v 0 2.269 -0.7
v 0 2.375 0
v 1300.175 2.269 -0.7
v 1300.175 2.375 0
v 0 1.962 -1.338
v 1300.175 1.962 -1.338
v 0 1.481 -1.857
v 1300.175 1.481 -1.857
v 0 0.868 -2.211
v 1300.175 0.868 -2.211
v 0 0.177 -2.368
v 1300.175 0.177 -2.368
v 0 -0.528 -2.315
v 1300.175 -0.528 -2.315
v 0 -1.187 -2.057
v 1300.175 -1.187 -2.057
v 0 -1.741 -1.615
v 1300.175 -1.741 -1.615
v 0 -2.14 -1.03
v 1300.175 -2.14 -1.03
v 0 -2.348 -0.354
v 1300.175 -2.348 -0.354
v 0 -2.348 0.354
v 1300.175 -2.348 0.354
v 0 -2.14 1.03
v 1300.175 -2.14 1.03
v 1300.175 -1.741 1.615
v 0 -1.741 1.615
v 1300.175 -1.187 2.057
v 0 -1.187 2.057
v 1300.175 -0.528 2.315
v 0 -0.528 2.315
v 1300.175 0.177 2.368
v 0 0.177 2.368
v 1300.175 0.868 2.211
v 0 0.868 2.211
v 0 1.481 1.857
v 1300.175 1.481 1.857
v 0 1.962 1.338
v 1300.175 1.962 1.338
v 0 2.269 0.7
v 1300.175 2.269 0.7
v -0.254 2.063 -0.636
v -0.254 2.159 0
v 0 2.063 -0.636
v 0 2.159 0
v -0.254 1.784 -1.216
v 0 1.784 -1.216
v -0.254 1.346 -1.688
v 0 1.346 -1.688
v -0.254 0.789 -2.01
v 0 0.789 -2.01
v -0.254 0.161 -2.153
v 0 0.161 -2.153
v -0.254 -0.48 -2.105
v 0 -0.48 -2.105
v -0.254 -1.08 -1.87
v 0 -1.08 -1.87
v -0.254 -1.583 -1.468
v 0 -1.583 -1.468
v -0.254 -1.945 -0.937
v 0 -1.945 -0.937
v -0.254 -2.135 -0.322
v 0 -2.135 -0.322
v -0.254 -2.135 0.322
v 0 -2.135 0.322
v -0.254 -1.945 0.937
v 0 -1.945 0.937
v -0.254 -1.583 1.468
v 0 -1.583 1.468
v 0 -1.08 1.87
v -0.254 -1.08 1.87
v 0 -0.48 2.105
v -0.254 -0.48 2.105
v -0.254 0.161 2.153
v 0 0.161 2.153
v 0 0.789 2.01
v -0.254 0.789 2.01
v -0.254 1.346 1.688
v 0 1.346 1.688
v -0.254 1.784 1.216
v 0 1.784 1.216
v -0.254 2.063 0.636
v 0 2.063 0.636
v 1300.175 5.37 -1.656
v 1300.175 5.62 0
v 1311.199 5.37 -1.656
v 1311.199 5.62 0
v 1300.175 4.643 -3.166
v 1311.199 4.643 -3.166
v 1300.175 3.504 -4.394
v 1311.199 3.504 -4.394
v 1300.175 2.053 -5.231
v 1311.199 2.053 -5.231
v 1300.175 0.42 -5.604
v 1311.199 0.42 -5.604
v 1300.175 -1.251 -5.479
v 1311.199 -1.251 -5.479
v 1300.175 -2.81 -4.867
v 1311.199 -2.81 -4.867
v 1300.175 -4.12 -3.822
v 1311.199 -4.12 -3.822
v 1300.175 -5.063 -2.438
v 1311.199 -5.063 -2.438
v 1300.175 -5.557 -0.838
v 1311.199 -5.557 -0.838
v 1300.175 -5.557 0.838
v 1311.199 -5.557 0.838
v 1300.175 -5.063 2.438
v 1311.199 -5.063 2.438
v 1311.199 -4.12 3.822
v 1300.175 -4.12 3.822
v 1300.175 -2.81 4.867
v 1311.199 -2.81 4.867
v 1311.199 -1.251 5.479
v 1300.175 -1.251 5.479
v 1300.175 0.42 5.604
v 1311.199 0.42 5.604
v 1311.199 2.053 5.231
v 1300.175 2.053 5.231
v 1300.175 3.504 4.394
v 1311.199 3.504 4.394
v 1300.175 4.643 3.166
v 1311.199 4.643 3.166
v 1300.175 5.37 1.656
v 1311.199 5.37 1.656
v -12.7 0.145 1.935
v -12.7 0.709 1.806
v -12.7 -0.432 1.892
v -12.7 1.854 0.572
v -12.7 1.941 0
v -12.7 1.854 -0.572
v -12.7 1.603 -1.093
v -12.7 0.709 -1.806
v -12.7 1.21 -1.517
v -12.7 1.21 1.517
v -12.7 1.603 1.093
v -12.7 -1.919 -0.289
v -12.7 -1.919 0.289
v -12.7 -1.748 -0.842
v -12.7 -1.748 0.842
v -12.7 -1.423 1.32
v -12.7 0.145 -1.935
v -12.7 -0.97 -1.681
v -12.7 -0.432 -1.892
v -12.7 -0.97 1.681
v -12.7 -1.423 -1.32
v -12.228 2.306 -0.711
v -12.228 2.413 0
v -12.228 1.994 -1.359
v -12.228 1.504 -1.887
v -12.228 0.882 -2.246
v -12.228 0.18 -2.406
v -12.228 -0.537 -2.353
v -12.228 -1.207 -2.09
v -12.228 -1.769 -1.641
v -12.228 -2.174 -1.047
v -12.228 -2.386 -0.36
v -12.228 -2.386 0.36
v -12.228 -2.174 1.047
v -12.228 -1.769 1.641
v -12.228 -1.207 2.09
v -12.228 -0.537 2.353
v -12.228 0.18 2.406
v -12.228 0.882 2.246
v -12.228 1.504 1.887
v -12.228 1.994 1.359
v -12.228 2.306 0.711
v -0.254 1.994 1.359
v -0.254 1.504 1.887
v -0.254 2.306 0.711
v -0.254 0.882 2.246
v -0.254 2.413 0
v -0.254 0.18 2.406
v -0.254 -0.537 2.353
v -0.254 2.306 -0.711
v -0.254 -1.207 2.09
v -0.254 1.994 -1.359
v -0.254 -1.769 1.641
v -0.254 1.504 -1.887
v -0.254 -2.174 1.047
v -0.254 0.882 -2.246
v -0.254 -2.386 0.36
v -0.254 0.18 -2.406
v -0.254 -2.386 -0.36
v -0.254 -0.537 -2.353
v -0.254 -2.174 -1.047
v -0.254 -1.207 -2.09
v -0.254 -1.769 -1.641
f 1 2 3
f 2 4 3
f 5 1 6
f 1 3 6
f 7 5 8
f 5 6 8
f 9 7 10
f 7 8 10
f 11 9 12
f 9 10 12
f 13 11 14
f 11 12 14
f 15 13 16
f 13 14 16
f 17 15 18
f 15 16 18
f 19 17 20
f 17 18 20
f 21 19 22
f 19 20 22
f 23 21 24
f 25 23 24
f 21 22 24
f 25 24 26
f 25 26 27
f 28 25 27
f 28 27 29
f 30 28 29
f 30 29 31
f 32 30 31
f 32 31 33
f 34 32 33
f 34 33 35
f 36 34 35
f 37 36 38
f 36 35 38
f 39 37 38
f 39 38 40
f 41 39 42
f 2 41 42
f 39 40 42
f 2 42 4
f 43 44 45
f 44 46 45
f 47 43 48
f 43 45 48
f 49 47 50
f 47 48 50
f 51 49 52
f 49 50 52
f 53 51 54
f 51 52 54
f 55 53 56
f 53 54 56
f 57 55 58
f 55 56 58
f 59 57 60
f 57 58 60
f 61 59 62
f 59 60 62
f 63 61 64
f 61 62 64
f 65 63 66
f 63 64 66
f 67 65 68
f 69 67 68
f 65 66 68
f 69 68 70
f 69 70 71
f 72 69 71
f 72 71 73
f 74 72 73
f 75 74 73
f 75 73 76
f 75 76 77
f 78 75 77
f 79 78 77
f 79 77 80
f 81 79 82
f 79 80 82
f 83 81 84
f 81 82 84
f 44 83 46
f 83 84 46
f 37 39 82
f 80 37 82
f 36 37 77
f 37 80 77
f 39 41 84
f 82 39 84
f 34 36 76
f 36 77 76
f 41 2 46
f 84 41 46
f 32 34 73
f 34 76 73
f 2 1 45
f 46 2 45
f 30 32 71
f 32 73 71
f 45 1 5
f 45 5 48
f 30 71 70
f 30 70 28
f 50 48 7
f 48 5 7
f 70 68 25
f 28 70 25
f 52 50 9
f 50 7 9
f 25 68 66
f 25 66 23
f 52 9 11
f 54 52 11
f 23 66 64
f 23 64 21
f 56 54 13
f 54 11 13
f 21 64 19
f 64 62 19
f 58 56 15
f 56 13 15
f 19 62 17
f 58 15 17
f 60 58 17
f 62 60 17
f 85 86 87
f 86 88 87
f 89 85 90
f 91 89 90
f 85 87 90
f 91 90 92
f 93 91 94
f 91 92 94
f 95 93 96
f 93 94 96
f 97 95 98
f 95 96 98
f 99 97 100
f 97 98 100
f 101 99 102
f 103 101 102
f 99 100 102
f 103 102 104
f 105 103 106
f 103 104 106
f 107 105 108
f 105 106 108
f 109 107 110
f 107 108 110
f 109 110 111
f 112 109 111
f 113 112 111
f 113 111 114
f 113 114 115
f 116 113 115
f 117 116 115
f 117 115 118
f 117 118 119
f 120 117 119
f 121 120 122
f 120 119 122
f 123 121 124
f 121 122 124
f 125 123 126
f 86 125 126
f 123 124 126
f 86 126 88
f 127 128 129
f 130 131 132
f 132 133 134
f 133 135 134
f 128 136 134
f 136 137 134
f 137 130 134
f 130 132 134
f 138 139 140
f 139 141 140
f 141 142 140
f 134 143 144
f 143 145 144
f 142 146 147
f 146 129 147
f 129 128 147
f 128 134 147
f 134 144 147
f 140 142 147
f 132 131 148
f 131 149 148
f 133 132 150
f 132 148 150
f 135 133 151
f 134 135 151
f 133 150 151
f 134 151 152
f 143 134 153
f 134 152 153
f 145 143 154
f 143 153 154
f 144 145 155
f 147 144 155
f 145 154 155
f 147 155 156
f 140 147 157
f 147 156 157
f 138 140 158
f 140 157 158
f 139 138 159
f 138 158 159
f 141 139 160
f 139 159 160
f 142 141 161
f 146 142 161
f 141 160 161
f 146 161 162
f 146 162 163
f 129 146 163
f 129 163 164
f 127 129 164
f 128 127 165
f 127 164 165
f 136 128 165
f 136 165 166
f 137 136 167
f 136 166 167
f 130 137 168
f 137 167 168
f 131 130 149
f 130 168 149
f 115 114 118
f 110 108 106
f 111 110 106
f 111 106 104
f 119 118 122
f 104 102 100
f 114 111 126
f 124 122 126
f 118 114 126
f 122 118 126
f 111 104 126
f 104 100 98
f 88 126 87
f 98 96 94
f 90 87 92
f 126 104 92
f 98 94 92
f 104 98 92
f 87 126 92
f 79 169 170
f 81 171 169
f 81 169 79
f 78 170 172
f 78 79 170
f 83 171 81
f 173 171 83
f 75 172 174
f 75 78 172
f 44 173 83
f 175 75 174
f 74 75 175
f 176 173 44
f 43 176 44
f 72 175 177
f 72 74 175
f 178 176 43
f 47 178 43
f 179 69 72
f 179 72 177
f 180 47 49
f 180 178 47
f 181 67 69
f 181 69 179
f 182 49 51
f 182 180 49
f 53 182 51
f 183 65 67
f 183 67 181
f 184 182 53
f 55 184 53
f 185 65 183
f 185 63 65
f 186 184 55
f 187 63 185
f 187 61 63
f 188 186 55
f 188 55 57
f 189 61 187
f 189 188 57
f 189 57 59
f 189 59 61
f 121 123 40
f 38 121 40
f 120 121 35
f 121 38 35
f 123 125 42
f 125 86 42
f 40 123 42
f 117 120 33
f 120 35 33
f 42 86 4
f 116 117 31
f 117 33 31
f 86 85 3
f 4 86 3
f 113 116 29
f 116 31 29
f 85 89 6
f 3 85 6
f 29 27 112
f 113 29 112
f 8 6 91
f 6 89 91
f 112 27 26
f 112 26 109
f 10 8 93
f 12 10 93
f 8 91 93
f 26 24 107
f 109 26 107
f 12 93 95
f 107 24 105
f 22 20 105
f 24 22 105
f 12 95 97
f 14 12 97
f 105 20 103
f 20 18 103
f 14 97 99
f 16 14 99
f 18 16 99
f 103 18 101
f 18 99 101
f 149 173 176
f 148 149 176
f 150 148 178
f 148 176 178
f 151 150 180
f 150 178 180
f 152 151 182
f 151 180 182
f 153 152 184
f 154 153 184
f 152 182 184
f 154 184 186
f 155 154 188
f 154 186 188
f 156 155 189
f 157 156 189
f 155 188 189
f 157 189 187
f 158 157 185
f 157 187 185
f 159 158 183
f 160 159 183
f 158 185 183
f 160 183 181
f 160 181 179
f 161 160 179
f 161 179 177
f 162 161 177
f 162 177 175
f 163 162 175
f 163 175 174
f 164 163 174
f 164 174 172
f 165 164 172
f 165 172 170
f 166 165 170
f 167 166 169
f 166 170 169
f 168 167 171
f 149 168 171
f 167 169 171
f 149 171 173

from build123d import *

# Parameters (mm, degrees)
SKETCH3_W = 0.254
SKETCH3_H = 0.508


with BuildPart() as part:
    # Sketch1 → Revolve1 (revolve)
    with BuildSketch(Plane.XY):
        Polygon((0, 0), (0, 2.3749), (1300.1752, 2.3749), (1300.1752, 5.61975), (1311.1988, 5.61975), (1311.1988, 0), align=None)
    revolve(axis=Axis((1311.1988, 0, 0), (-1, 0, 0)))

    # Sketch2 → Revolve2 (revolve)
    with BuildSketch(Plane.XY):
        Polygon((-12.7, 0), (-12.7, 1.94056), (-12.22756, 2.413), (0, 2.413), (0, 0), align=None)
    revolve(axis=Axis((0, 0, 0), (-1, 0, 0)))

    # Sketch3 → Cut-Revolve1 (revolve, cut)
    with BuildSketch(Plane.XY):
        with Locations((-0.127, 2.413)):
            Rectangle(SKETCH3_W, SKETCH3_H)
    revolve(axis=Axis((0, 0, 0), (-1, 0, 0)), mode=Mode.SUBTRACT)


solid = part.part
